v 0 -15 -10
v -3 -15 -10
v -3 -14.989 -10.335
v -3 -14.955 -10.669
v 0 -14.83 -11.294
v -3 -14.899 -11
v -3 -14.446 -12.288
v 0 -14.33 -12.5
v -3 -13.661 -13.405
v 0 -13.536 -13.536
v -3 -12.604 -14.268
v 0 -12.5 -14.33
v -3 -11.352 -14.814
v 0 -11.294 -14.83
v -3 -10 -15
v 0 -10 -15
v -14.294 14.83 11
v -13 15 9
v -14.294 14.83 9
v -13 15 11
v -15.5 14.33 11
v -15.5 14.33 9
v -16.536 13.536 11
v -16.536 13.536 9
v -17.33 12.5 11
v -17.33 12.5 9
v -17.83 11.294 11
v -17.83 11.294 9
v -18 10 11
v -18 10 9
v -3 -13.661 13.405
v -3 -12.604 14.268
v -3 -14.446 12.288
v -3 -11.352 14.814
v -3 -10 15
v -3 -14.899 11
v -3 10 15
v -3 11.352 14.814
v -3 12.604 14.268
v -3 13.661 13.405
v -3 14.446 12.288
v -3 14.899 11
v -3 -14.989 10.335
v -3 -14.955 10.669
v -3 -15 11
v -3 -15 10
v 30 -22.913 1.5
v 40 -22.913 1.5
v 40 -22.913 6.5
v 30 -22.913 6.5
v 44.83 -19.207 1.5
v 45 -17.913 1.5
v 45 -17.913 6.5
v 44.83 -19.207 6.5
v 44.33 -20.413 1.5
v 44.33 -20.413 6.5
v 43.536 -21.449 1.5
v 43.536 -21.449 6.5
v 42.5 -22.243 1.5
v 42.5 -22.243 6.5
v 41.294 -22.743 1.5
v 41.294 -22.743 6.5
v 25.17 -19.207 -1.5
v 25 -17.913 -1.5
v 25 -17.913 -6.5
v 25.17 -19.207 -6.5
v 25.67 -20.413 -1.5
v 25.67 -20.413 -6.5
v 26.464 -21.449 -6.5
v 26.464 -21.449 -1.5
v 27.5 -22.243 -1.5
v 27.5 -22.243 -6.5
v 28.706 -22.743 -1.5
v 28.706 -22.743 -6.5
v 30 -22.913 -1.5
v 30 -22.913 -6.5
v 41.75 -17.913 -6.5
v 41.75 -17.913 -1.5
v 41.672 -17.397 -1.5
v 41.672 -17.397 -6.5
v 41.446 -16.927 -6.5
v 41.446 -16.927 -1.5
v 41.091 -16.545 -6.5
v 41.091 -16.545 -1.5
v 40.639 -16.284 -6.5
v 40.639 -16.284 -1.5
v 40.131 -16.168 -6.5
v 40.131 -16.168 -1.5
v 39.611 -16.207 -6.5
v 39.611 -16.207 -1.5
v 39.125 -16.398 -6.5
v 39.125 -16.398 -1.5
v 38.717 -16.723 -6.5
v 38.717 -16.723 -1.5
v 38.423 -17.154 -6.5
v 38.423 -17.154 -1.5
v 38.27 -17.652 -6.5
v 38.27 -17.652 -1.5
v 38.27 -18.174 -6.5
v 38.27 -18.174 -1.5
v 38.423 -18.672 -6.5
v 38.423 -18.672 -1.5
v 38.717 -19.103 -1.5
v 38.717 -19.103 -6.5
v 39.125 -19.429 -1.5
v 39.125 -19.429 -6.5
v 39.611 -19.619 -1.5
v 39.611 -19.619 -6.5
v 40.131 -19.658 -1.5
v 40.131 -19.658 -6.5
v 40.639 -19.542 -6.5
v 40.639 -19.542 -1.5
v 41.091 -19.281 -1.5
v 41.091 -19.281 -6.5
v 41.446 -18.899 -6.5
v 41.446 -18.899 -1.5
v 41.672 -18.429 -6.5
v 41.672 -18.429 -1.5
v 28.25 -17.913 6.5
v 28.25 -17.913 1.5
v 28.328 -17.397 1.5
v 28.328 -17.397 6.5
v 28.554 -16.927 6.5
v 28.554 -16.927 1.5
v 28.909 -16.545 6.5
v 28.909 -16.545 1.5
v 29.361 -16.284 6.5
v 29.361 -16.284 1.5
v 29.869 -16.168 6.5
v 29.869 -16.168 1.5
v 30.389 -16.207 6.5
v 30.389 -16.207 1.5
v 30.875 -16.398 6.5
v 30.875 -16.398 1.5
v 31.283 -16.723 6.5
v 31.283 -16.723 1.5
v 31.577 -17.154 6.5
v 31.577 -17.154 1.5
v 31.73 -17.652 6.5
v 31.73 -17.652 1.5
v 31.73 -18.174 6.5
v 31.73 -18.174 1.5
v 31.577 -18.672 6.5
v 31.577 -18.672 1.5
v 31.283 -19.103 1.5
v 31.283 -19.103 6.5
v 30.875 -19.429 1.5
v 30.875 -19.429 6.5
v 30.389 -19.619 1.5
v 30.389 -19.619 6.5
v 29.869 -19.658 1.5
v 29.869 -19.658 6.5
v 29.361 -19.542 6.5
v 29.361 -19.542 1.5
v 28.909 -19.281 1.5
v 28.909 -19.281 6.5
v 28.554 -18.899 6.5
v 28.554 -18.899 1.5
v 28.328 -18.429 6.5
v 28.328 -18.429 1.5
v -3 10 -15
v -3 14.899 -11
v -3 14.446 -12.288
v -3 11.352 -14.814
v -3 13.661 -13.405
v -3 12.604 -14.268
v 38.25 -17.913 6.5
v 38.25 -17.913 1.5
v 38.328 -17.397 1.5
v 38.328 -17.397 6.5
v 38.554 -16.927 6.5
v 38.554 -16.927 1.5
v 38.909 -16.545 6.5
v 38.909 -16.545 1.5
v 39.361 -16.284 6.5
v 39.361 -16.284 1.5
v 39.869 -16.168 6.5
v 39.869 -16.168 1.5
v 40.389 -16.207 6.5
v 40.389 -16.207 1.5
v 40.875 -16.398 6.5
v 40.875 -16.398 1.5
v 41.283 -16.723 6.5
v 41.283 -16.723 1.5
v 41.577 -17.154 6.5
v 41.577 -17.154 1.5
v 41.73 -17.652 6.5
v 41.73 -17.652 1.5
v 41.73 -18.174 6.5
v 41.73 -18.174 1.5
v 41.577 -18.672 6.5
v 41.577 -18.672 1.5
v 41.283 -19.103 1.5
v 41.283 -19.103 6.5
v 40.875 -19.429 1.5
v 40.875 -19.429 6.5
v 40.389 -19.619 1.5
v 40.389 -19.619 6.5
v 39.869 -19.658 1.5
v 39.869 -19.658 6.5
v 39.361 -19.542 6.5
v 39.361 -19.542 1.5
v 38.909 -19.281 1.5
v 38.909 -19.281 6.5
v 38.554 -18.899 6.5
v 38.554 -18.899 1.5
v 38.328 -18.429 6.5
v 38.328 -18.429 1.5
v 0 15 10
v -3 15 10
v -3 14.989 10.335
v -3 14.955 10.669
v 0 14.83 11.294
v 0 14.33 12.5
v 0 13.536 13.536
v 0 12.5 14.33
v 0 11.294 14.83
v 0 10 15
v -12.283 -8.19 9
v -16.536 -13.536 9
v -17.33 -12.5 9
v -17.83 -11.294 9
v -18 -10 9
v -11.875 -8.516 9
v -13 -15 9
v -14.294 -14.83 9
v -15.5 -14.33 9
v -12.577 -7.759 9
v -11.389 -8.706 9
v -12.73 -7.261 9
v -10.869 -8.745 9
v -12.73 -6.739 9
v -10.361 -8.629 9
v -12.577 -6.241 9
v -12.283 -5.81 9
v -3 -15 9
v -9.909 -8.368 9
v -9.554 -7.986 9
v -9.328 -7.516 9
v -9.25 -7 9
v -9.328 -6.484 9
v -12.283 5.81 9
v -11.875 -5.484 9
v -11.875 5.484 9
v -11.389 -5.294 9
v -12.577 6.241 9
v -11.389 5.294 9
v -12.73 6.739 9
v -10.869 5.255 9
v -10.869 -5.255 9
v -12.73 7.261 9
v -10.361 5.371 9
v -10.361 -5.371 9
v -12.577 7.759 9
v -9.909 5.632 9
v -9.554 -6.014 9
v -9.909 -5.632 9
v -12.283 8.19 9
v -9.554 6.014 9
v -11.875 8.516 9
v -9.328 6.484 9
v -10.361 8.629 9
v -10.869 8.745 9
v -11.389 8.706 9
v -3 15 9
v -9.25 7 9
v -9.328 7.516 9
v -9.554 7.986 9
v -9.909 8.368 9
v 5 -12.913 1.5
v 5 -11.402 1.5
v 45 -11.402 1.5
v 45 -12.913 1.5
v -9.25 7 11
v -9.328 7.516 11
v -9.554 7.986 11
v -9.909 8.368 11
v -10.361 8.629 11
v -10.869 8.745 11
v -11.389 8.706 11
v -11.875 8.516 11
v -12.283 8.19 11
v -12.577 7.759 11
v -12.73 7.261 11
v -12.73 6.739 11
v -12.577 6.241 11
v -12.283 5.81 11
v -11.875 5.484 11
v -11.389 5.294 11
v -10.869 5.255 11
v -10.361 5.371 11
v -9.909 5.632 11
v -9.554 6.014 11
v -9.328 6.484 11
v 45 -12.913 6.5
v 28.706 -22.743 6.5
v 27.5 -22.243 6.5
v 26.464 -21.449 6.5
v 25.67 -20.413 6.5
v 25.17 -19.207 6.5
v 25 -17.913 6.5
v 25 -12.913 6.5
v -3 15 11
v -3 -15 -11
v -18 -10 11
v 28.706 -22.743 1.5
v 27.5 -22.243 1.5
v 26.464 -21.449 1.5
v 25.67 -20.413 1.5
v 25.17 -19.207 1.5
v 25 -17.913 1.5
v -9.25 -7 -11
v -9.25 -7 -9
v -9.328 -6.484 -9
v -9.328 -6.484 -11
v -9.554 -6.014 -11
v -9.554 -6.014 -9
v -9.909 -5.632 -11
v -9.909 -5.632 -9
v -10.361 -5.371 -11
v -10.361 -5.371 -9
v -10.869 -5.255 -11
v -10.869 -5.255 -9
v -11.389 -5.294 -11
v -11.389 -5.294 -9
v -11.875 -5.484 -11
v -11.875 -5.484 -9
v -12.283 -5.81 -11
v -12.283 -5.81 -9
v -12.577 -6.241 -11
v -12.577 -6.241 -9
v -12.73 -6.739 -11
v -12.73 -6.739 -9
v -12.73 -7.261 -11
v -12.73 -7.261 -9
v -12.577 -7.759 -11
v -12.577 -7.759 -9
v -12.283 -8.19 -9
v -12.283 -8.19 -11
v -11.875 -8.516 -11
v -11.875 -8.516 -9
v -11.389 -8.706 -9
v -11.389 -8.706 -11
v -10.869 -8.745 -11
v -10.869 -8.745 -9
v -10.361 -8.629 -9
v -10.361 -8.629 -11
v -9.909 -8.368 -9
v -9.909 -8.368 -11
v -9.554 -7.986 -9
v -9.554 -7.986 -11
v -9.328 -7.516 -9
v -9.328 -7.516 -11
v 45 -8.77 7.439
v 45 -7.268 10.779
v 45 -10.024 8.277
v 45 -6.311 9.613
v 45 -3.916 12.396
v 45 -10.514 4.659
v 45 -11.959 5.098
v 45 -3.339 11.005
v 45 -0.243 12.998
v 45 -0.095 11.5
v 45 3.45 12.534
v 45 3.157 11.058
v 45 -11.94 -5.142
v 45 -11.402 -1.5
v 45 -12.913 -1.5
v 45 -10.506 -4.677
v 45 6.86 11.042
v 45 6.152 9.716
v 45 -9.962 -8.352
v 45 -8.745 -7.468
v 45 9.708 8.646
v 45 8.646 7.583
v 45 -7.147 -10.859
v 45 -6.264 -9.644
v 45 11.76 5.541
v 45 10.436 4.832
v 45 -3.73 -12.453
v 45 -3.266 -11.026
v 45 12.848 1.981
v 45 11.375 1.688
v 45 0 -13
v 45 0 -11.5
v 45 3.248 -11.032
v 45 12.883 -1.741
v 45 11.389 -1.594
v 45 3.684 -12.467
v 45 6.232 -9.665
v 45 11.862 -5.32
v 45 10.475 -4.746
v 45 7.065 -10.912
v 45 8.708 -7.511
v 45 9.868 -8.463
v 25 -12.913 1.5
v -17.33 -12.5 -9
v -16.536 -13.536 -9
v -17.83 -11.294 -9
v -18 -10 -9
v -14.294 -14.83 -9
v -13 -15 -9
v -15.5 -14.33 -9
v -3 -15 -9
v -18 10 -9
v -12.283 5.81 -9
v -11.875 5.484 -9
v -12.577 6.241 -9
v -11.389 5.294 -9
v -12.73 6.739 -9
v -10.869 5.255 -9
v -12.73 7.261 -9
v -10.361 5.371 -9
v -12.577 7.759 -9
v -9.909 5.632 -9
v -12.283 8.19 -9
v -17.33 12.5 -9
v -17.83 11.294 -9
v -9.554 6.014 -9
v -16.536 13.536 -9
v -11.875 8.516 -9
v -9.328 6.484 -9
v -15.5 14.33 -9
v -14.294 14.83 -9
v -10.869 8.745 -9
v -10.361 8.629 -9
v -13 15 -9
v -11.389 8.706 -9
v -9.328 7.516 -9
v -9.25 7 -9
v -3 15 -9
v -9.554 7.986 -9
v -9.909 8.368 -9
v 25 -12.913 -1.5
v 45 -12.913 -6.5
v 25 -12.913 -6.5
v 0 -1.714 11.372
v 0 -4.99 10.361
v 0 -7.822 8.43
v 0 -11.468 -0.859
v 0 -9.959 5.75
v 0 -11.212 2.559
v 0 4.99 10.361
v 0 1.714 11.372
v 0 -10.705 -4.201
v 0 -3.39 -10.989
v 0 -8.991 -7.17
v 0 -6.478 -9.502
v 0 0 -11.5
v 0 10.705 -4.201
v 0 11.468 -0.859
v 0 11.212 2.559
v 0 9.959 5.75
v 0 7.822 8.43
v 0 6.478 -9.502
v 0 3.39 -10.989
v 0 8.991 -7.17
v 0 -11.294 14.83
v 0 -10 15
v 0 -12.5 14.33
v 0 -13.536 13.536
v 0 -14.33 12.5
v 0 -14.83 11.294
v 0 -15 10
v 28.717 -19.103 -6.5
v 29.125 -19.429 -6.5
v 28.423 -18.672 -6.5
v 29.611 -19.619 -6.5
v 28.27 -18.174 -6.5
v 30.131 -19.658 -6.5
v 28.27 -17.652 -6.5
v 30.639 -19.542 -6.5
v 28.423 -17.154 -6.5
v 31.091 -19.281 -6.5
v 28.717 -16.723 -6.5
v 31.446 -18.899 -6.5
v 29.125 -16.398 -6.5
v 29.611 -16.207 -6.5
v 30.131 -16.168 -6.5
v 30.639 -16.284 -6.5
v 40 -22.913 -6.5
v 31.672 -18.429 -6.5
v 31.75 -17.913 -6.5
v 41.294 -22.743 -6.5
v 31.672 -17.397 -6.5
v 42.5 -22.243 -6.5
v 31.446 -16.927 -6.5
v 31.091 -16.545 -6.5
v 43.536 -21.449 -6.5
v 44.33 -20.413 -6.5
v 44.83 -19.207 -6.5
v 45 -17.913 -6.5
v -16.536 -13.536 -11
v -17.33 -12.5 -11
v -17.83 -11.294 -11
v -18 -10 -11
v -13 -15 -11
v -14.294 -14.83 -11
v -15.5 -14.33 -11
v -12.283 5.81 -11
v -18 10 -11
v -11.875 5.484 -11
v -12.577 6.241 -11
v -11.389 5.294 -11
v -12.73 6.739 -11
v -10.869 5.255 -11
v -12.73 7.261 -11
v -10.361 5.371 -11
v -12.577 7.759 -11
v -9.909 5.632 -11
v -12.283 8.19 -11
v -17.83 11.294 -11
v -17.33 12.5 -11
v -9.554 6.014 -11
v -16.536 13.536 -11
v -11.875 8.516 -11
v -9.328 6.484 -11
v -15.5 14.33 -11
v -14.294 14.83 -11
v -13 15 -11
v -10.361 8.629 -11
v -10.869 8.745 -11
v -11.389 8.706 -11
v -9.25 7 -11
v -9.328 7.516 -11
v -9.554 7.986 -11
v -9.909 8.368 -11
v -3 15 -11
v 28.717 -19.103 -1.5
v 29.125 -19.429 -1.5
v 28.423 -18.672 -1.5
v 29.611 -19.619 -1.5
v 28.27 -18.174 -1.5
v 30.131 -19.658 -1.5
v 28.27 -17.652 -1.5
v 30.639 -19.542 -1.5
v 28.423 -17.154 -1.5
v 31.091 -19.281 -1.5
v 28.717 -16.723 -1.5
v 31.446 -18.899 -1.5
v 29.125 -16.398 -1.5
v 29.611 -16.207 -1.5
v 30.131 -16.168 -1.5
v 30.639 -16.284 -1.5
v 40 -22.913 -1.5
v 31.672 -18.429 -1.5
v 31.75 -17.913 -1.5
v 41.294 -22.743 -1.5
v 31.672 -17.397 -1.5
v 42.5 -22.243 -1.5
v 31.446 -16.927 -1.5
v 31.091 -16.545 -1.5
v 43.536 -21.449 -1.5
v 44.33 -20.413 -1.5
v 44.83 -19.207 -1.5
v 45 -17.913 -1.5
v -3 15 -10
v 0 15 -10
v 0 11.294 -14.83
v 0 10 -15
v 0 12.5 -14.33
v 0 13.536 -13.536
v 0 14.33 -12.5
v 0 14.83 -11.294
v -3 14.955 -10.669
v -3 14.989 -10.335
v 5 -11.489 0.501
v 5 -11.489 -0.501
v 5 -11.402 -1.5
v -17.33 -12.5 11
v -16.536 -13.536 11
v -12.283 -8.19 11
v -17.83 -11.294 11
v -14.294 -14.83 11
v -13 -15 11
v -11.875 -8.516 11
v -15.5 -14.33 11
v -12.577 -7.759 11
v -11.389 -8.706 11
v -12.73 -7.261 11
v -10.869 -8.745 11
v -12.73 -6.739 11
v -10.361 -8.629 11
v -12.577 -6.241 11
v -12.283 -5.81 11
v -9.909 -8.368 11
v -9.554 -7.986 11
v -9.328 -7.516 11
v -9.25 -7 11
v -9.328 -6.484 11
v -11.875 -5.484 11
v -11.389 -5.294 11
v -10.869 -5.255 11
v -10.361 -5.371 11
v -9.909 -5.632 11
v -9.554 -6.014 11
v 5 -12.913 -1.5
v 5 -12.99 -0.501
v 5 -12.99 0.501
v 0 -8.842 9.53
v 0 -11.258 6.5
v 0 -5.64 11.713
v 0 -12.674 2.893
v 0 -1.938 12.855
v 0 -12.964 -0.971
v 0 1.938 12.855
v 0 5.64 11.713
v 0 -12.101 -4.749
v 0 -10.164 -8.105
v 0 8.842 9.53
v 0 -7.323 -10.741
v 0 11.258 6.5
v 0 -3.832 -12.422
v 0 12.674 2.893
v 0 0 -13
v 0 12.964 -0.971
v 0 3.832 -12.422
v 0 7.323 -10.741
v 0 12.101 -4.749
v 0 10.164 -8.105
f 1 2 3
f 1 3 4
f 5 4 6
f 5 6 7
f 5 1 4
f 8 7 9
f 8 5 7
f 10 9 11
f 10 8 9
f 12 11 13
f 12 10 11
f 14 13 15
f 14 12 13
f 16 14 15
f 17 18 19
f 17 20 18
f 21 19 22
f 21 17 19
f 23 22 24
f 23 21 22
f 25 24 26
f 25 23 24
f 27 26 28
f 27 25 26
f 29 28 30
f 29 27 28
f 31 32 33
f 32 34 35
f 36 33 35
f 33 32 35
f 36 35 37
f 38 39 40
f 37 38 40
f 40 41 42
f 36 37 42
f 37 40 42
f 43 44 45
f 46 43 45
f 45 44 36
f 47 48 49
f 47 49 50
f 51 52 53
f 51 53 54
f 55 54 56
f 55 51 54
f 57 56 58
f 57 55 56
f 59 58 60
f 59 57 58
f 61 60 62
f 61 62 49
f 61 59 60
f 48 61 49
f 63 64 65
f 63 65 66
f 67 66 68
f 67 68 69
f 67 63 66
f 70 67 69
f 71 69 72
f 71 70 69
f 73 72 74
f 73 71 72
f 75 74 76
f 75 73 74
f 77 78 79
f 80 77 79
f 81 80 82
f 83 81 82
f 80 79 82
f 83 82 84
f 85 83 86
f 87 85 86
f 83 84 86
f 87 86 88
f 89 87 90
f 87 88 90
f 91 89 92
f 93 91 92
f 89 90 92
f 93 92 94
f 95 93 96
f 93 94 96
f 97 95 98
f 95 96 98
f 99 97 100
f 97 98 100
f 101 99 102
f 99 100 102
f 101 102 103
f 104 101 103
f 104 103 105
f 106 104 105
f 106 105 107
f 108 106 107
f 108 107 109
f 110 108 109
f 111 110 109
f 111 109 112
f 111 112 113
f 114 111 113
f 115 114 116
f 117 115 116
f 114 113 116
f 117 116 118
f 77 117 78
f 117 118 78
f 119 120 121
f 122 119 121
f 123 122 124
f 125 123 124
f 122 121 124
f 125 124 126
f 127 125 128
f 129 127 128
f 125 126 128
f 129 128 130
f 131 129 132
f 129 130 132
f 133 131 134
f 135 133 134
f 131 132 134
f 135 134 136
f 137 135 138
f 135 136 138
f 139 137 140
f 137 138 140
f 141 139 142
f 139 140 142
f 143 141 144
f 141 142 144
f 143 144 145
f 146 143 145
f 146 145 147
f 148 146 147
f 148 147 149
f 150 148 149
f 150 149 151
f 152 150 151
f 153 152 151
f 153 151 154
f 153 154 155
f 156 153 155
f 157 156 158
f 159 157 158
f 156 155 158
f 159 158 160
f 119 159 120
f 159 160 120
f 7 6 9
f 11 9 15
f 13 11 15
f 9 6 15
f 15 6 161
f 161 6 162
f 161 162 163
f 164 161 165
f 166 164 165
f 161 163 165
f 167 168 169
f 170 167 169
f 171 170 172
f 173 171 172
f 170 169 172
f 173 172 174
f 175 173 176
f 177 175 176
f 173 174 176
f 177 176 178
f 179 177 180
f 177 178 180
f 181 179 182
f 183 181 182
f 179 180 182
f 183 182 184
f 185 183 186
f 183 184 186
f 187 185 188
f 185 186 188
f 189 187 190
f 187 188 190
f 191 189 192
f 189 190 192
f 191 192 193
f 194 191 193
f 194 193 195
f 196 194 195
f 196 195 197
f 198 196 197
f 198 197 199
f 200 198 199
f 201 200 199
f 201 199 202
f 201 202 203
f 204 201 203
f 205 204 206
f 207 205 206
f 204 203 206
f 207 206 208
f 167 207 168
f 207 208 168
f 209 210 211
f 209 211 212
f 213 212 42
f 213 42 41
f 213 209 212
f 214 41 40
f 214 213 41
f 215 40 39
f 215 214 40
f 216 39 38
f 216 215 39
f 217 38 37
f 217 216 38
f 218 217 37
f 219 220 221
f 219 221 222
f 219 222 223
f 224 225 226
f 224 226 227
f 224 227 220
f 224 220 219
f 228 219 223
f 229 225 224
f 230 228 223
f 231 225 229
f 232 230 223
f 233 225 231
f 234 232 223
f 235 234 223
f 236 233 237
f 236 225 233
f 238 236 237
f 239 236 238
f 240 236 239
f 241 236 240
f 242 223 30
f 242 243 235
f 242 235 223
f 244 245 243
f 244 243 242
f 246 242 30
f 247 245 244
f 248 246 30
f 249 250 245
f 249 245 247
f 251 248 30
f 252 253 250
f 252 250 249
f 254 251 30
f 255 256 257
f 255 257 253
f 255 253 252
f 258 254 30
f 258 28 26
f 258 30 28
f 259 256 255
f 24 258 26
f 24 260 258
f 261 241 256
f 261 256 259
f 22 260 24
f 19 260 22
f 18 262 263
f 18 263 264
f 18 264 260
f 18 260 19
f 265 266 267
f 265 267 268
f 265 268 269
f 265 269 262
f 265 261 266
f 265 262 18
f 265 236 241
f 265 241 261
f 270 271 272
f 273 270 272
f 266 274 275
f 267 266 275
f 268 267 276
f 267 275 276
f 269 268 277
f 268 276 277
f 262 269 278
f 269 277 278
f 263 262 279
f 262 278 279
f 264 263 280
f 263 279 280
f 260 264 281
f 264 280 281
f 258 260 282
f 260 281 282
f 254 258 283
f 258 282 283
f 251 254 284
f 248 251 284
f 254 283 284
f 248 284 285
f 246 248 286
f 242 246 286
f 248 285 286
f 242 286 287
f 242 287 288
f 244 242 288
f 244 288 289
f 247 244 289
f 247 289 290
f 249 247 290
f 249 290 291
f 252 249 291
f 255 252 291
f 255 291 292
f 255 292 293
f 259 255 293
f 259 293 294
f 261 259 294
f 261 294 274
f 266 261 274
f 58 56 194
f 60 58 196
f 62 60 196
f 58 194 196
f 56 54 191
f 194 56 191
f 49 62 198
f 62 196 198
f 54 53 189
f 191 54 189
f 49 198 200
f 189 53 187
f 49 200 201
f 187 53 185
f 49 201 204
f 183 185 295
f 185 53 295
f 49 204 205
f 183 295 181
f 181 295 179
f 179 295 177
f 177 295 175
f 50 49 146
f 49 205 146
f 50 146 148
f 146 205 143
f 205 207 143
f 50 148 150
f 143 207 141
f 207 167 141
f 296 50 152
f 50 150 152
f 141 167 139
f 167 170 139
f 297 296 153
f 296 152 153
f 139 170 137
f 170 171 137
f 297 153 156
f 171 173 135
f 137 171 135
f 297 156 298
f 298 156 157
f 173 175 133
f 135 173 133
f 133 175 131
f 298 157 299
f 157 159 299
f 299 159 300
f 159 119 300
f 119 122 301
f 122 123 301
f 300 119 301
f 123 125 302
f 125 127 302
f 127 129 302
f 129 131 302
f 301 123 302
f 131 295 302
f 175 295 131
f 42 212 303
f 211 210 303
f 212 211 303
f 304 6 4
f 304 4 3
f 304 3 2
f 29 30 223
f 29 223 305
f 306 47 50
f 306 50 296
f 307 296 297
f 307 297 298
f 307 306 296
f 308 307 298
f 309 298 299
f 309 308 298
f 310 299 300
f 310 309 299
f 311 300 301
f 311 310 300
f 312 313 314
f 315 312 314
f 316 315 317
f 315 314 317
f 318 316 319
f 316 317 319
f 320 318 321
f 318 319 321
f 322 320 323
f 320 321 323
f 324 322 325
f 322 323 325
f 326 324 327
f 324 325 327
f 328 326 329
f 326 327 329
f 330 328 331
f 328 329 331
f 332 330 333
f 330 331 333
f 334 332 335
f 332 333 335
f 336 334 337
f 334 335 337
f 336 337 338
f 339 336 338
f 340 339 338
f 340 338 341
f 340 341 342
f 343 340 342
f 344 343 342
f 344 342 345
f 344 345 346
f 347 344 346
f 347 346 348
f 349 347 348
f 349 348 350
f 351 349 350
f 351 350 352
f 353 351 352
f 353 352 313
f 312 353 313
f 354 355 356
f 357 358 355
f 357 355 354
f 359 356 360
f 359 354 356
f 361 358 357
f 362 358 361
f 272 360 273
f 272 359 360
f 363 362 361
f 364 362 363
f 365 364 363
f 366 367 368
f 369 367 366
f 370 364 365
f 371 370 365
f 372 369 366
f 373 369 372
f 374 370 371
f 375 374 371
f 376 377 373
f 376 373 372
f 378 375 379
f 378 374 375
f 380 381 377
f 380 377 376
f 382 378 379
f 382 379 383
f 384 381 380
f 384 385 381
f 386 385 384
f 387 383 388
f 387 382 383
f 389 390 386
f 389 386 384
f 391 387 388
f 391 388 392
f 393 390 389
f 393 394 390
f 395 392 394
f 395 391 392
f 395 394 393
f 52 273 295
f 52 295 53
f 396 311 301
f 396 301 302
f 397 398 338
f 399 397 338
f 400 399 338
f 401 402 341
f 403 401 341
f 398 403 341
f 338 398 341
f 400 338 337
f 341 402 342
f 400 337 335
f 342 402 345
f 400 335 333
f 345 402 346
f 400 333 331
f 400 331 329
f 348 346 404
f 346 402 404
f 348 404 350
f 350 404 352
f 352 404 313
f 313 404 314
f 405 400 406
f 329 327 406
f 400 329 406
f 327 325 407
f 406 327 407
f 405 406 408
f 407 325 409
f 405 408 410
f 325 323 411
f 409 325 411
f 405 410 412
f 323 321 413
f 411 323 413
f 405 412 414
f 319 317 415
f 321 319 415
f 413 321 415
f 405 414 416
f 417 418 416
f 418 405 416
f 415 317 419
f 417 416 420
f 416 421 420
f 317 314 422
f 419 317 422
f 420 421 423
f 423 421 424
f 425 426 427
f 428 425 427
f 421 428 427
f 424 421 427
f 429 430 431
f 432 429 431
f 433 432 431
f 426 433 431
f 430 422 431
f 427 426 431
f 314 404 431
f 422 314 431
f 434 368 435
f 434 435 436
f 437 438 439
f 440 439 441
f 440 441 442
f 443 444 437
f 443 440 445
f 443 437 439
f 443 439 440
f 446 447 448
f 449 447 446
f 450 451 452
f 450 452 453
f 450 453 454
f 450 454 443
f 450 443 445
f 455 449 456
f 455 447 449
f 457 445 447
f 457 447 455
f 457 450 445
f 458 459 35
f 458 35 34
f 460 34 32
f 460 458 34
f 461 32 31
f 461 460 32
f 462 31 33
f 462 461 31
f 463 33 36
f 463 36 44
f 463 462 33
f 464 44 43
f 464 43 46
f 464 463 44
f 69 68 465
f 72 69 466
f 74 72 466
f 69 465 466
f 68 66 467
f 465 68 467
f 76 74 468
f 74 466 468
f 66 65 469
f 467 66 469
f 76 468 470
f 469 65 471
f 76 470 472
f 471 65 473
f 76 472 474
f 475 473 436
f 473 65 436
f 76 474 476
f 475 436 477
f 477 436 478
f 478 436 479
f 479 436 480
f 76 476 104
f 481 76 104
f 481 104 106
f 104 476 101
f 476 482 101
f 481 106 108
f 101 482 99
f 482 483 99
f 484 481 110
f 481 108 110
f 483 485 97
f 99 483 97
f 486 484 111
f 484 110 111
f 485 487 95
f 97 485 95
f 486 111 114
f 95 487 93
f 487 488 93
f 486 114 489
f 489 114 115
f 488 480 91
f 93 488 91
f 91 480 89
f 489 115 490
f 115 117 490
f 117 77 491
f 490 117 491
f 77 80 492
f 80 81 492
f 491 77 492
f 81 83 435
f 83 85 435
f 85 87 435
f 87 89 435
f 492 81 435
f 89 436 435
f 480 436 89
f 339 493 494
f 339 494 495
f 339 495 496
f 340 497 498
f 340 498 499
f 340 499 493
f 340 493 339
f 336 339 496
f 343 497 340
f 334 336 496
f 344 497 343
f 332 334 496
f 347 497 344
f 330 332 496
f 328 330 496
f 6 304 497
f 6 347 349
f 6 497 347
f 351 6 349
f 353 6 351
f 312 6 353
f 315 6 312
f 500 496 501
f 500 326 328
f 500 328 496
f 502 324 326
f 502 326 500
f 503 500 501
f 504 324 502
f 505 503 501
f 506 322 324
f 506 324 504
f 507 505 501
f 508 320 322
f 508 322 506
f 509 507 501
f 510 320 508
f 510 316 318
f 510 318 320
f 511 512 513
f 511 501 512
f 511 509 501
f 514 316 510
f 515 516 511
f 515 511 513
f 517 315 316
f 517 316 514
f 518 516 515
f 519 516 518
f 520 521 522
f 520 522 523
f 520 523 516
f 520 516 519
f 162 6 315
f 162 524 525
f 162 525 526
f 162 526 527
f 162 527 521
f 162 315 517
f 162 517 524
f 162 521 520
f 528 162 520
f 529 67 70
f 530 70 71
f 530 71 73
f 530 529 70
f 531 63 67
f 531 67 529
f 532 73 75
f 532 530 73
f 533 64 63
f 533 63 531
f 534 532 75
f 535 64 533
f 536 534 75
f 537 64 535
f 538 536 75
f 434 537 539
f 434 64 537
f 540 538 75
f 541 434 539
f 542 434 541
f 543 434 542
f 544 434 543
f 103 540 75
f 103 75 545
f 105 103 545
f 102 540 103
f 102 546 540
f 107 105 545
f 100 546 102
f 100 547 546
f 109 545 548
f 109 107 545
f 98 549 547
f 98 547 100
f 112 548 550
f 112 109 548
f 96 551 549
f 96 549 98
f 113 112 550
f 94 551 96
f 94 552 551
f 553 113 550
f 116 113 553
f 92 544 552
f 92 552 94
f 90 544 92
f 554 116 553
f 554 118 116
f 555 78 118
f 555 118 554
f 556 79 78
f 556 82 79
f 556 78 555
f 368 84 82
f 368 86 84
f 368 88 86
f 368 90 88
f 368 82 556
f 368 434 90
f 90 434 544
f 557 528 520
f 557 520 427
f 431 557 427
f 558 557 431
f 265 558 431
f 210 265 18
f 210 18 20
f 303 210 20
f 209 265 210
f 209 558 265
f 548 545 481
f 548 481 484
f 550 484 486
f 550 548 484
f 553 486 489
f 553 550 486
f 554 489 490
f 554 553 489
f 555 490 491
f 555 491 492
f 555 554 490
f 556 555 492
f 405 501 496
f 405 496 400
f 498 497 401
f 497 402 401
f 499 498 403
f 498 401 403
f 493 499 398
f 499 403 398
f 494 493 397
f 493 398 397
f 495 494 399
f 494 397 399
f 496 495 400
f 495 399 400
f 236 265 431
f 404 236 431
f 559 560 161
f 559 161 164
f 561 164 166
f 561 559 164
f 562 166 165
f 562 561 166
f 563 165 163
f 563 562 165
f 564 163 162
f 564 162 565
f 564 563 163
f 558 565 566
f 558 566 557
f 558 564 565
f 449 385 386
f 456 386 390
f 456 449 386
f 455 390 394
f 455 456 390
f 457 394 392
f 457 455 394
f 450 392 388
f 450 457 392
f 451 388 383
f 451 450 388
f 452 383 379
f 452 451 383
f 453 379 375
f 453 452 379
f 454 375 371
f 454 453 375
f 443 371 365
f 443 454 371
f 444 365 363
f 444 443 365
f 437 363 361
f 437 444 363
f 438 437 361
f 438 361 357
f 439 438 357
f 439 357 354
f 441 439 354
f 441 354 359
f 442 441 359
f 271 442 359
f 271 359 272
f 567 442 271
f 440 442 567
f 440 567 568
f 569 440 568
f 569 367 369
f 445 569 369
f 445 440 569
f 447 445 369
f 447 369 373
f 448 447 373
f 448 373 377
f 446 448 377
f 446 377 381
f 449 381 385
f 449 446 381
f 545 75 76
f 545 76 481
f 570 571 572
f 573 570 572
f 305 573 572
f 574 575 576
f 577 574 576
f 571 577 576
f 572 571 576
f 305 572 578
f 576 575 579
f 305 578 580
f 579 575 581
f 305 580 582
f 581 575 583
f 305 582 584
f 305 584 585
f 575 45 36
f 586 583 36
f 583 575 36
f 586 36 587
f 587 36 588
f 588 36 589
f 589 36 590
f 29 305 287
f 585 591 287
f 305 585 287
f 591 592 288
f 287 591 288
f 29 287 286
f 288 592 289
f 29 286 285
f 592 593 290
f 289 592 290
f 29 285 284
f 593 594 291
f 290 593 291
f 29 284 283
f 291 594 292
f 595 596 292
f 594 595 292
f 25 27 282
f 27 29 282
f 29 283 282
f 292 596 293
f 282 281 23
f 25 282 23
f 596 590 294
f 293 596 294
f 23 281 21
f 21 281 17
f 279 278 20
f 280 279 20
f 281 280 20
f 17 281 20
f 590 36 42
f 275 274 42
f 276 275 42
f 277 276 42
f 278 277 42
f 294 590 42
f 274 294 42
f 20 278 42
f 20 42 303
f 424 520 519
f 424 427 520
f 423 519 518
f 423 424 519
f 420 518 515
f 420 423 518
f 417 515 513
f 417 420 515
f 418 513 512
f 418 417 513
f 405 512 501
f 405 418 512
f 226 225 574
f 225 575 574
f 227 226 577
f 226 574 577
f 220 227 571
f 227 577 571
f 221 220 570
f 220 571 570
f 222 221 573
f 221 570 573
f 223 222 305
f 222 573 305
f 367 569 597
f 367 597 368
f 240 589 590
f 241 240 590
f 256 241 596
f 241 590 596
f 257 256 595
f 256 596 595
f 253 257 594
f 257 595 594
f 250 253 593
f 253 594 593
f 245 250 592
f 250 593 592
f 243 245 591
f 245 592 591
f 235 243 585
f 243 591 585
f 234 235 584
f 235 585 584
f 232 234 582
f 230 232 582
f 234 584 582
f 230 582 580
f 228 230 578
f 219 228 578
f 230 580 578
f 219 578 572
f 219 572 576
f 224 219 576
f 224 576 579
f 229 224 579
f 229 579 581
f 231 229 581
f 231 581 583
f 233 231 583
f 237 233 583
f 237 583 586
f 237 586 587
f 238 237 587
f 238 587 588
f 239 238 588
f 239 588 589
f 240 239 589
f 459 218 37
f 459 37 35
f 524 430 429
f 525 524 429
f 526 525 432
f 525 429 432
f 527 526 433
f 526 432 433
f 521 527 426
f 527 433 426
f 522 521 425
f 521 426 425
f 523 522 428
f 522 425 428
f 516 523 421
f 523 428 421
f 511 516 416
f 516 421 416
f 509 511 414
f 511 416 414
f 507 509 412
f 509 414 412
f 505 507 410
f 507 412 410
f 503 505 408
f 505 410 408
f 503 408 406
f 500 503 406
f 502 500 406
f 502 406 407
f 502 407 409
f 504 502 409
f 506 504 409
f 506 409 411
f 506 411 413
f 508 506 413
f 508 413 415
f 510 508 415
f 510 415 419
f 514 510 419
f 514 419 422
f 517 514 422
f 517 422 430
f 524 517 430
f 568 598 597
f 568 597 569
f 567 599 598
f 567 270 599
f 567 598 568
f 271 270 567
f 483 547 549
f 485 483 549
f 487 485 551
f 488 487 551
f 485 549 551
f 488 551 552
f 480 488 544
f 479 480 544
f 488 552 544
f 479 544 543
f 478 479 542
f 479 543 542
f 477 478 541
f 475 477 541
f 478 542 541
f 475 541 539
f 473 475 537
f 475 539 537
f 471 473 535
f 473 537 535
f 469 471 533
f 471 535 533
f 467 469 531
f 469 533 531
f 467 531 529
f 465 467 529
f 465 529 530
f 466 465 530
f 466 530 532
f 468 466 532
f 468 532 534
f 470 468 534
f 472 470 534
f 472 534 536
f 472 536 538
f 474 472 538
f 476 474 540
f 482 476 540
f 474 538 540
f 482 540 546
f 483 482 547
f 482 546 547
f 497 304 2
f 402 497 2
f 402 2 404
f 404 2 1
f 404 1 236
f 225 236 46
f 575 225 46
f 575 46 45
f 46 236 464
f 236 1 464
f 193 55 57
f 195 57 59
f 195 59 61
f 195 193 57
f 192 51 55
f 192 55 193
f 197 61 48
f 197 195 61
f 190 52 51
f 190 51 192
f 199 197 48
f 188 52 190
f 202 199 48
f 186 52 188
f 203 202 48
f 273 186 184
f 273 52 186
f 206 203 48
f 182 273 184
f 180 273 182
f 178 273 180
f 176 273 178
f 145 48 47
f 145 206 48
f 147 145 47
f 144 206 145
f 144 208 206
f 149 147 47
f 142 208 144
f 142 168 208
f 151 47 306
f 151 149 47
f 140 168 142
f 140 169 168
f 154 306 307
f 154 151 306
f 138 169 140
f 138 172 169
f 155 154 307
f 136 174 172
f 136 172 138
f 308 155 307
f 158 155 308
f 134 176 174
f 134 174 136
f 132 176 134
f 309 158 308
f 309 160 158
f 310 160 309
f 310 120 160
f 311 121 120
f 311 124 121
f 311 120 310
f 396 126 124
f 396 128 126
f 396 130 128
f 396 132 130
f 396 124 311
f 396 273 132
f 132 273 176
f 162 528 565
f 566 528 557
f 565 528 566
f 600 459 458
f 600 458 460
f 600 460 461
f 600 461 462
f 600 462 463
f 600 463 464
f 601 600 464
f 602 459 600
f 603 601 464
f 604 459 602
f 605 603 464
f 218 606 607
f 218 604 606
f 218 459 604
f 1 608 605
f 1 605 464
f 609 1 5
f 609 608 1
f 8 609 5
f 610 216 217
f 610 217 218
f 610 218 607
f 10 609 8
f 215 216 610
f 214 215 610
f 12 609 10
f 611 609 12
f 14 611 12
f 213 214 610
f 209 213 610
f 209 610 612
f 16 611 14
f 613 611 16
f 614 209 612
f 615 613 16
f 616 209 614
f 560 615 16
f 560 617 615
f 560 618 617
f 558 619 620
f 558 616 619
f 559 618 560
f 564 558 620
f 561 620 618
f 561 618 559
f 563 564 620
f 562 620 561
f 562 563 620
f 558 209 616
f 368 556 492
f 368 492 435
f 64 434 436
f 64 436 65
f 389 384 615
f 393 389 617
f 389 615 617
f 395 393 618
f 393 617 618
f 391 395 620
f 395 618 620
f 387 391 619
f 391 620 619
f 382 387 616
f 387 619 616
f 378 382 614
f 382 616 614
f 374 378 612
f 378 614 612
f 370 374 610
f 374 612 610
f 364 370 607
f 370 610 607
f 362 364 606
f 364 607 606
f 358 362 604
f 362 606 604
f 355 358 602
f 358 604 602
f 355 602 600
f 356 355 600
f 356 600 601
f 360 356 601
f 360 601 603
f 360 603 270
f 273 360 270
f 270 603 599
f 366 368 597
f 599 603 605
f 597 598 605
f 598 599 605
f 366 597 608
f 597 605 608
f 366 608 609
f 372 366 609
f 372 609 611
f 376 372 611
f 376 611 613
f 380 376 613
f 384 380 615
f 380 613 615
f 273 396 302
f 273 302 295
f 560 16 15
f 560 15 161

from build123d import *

# Parameters (mm, degrees)
SKETCH1_R            = 13
SKETCH1_R_2          = 11.5
BOSS_EXTRUDE5_DEPTH  = 45
BOSS_EXTRUDE7_DEPTH  = 3
SKETCH6_W            = 2
SKETCH6_H            = 30
BOSS_EXTRUDE8_DEPTH  = 15
SKETCH7_W            = 40
SKETCH7_H            = 9.743944637
CUT_EXTRUDE1_DEPTH   = 1.5
FILLET1_R            = 5
SKETCH8_R            = 1.75
CUT_EXTRUDE2_DEPTH   = 77
SKETCH9_R            = 1.75
BOSS_EXTRUDE9_DEPTH  = 5
SKETCH12_R           = 1.75
BOSS_EXTRUDE10_DEPTH = 5


with BuildPart() as part:
    # Sketch1 → Boss-Extrude5 (new body)
    with BuildSketch(Plane(origin=(0, 0, 0), x_dir=(0, 0, -1), z_dir=(1, 0, 0))):
        Circle(SKETCH1_R)
        Circle(SKETCH1_R_2, mode=Mode.SUBTRACT)
    extrude(amount=BOSS_EXTRUDE5_DEPTH)

    # Sketch5 → Boss-Extrude7 (add)
    with BuildSketch(Plane.ZY):
        with BuildLine():
            Line((-10, 15), (10, 15))
            ThreePointArc((10, 15), (13.535533906, 13.535533906), (15, 10))
            Line((15, 10), (15, -10))
            ThreePointArc((15, -10), (13.535533906, -13.535533906), (10, -15))
            Line((10, -15), (-10, -15))
            ThreePointArc((-10, -15), (-13.535533906, -13.535533906), (-15, -10))
            Line((-15, -10), (-15, 10))
            ThreePointArc((-15, 10), (-13.535533906, 13.535533906), (-10, 15))
        make_face()
    extrude(amount=BOSS_EXTRUDE7_DEPTH)

    # Sketch6 → Boss-Extrude8 (add)
    with BuildSketch(Plane.ZY.offset(3)):
        with Locations((-10, 0)):
            Rectangle(SKETCH6_W, SKETCH6_H)
        with Locations((10, 0)):
            Rectangle(SKETCH6_W, SKETCH6_H)
    extrude(amount=BOSS_EXTRUDE8_DEPTH)

    # Sketch7 → Cut-Extrude1 (cut, symmetric)
    with BuildSketch(Plane.XY):
        with Locations((25, -13.102652826)):
            Rectangle(SKETCH7_W, SKETCH7_H)
    extrude(amount=CUT_EXTRUDE1_DEPTH, both=True, mode=Mode.SUBTRACT)

    # Fillet1
    fillet1_edges = [part.edges().sort_by_distance(p)[0] for p in [
        (-18, -15, -10),
        (-18, 15, -10),
        (-18, -15, 10),
        (-18, 15, 10),
    ]]
    fillet(fillet1_edges, radius=FILLET1_R)

    # Sketch8 → Cut-Extrude2 (cut)
    with BuildSketch(Plane.XY.offset(11)):
        with Locations((-11, 7)):
            Circle(SKETCH8_R)
        with Locations((-11, -7)):
            Circle(SKETCH8_R)
    extrude(amount=-CUT_EXTRUDE2_DEPTH, mode=Mode.SUBTRACT)


with BuildPart() as body_2:
    # Sketch9 → Boss-Extrude9 (new body)
    with BuildSketch(Plane.XY.offset(-1.5)):
        with BuildLine():
            Line((45, -12.91317157), (25, -12.91317157))
            Line((25, -12.91317157), (25, -17.91317157))
            ThreePointArc((25, -17.91317157), (26.464466094, -21.448705476), (30, -22.91317157))
            Line((30, -22.91317157), (40, -22.91317157))
            ThreePointArc((40, -22.91317157), (43.535533906, -21.448705476), (45, -17.91317157))
            Line((45, -17.91317157), (45, -12.91317157))
        make_face()
        with Locations((40, -17.91317157)):
            Circle(SKETCH9_R, mode=Mode.SUBTRACT)
        with Locations((30, -17.91317157)):
            Circle(SKETCH9_R, mode=Mode.SUBTRACT)
    extrude(amount=-BOSS_EXTRUDE9_DEPTH)


with BuildPart() as body_3:
    # Sketch12 → Boss-Extrude10 (new body)
    with BuildSketch(Plane(origin=(0, 0, 1.5), x_dir=(-1, 0, 0), z_dir=(0, 0, -1))):
        with BuildLine():
            Line((-45, -12.91317157), (-45, -17.91317157))
            ThreePointArc((-45, -17.91317157), (-43.535533906, -21.448705476), (-40, -22.91317157))
            Line((-40, -22.91317157), (-30, -22.91317157))
            ThreePointArc((-30, -22.91317157), (-26.464466094, -21.448705476), (-25, -17.91317157))
            Line((-25, -17.91317157), (-25, -12.91317157))
            Line((-25, -12.91317157), (-45, -12.91317157))
        make_face()
        with Locations((-30, -17.91317157)):
            Circle(SKETCH12_R, mode=Mode.SUBTRACT)
        with Locations((-40, -17.91317157)):
            Circle(SKETCH12_R, mode=Mode.SUBTRACT)
    extrude(amount=-BOSS_EXTRUDE10_DEPTH)


solid = Compound([part.part, body_2.part, body_3.part])
